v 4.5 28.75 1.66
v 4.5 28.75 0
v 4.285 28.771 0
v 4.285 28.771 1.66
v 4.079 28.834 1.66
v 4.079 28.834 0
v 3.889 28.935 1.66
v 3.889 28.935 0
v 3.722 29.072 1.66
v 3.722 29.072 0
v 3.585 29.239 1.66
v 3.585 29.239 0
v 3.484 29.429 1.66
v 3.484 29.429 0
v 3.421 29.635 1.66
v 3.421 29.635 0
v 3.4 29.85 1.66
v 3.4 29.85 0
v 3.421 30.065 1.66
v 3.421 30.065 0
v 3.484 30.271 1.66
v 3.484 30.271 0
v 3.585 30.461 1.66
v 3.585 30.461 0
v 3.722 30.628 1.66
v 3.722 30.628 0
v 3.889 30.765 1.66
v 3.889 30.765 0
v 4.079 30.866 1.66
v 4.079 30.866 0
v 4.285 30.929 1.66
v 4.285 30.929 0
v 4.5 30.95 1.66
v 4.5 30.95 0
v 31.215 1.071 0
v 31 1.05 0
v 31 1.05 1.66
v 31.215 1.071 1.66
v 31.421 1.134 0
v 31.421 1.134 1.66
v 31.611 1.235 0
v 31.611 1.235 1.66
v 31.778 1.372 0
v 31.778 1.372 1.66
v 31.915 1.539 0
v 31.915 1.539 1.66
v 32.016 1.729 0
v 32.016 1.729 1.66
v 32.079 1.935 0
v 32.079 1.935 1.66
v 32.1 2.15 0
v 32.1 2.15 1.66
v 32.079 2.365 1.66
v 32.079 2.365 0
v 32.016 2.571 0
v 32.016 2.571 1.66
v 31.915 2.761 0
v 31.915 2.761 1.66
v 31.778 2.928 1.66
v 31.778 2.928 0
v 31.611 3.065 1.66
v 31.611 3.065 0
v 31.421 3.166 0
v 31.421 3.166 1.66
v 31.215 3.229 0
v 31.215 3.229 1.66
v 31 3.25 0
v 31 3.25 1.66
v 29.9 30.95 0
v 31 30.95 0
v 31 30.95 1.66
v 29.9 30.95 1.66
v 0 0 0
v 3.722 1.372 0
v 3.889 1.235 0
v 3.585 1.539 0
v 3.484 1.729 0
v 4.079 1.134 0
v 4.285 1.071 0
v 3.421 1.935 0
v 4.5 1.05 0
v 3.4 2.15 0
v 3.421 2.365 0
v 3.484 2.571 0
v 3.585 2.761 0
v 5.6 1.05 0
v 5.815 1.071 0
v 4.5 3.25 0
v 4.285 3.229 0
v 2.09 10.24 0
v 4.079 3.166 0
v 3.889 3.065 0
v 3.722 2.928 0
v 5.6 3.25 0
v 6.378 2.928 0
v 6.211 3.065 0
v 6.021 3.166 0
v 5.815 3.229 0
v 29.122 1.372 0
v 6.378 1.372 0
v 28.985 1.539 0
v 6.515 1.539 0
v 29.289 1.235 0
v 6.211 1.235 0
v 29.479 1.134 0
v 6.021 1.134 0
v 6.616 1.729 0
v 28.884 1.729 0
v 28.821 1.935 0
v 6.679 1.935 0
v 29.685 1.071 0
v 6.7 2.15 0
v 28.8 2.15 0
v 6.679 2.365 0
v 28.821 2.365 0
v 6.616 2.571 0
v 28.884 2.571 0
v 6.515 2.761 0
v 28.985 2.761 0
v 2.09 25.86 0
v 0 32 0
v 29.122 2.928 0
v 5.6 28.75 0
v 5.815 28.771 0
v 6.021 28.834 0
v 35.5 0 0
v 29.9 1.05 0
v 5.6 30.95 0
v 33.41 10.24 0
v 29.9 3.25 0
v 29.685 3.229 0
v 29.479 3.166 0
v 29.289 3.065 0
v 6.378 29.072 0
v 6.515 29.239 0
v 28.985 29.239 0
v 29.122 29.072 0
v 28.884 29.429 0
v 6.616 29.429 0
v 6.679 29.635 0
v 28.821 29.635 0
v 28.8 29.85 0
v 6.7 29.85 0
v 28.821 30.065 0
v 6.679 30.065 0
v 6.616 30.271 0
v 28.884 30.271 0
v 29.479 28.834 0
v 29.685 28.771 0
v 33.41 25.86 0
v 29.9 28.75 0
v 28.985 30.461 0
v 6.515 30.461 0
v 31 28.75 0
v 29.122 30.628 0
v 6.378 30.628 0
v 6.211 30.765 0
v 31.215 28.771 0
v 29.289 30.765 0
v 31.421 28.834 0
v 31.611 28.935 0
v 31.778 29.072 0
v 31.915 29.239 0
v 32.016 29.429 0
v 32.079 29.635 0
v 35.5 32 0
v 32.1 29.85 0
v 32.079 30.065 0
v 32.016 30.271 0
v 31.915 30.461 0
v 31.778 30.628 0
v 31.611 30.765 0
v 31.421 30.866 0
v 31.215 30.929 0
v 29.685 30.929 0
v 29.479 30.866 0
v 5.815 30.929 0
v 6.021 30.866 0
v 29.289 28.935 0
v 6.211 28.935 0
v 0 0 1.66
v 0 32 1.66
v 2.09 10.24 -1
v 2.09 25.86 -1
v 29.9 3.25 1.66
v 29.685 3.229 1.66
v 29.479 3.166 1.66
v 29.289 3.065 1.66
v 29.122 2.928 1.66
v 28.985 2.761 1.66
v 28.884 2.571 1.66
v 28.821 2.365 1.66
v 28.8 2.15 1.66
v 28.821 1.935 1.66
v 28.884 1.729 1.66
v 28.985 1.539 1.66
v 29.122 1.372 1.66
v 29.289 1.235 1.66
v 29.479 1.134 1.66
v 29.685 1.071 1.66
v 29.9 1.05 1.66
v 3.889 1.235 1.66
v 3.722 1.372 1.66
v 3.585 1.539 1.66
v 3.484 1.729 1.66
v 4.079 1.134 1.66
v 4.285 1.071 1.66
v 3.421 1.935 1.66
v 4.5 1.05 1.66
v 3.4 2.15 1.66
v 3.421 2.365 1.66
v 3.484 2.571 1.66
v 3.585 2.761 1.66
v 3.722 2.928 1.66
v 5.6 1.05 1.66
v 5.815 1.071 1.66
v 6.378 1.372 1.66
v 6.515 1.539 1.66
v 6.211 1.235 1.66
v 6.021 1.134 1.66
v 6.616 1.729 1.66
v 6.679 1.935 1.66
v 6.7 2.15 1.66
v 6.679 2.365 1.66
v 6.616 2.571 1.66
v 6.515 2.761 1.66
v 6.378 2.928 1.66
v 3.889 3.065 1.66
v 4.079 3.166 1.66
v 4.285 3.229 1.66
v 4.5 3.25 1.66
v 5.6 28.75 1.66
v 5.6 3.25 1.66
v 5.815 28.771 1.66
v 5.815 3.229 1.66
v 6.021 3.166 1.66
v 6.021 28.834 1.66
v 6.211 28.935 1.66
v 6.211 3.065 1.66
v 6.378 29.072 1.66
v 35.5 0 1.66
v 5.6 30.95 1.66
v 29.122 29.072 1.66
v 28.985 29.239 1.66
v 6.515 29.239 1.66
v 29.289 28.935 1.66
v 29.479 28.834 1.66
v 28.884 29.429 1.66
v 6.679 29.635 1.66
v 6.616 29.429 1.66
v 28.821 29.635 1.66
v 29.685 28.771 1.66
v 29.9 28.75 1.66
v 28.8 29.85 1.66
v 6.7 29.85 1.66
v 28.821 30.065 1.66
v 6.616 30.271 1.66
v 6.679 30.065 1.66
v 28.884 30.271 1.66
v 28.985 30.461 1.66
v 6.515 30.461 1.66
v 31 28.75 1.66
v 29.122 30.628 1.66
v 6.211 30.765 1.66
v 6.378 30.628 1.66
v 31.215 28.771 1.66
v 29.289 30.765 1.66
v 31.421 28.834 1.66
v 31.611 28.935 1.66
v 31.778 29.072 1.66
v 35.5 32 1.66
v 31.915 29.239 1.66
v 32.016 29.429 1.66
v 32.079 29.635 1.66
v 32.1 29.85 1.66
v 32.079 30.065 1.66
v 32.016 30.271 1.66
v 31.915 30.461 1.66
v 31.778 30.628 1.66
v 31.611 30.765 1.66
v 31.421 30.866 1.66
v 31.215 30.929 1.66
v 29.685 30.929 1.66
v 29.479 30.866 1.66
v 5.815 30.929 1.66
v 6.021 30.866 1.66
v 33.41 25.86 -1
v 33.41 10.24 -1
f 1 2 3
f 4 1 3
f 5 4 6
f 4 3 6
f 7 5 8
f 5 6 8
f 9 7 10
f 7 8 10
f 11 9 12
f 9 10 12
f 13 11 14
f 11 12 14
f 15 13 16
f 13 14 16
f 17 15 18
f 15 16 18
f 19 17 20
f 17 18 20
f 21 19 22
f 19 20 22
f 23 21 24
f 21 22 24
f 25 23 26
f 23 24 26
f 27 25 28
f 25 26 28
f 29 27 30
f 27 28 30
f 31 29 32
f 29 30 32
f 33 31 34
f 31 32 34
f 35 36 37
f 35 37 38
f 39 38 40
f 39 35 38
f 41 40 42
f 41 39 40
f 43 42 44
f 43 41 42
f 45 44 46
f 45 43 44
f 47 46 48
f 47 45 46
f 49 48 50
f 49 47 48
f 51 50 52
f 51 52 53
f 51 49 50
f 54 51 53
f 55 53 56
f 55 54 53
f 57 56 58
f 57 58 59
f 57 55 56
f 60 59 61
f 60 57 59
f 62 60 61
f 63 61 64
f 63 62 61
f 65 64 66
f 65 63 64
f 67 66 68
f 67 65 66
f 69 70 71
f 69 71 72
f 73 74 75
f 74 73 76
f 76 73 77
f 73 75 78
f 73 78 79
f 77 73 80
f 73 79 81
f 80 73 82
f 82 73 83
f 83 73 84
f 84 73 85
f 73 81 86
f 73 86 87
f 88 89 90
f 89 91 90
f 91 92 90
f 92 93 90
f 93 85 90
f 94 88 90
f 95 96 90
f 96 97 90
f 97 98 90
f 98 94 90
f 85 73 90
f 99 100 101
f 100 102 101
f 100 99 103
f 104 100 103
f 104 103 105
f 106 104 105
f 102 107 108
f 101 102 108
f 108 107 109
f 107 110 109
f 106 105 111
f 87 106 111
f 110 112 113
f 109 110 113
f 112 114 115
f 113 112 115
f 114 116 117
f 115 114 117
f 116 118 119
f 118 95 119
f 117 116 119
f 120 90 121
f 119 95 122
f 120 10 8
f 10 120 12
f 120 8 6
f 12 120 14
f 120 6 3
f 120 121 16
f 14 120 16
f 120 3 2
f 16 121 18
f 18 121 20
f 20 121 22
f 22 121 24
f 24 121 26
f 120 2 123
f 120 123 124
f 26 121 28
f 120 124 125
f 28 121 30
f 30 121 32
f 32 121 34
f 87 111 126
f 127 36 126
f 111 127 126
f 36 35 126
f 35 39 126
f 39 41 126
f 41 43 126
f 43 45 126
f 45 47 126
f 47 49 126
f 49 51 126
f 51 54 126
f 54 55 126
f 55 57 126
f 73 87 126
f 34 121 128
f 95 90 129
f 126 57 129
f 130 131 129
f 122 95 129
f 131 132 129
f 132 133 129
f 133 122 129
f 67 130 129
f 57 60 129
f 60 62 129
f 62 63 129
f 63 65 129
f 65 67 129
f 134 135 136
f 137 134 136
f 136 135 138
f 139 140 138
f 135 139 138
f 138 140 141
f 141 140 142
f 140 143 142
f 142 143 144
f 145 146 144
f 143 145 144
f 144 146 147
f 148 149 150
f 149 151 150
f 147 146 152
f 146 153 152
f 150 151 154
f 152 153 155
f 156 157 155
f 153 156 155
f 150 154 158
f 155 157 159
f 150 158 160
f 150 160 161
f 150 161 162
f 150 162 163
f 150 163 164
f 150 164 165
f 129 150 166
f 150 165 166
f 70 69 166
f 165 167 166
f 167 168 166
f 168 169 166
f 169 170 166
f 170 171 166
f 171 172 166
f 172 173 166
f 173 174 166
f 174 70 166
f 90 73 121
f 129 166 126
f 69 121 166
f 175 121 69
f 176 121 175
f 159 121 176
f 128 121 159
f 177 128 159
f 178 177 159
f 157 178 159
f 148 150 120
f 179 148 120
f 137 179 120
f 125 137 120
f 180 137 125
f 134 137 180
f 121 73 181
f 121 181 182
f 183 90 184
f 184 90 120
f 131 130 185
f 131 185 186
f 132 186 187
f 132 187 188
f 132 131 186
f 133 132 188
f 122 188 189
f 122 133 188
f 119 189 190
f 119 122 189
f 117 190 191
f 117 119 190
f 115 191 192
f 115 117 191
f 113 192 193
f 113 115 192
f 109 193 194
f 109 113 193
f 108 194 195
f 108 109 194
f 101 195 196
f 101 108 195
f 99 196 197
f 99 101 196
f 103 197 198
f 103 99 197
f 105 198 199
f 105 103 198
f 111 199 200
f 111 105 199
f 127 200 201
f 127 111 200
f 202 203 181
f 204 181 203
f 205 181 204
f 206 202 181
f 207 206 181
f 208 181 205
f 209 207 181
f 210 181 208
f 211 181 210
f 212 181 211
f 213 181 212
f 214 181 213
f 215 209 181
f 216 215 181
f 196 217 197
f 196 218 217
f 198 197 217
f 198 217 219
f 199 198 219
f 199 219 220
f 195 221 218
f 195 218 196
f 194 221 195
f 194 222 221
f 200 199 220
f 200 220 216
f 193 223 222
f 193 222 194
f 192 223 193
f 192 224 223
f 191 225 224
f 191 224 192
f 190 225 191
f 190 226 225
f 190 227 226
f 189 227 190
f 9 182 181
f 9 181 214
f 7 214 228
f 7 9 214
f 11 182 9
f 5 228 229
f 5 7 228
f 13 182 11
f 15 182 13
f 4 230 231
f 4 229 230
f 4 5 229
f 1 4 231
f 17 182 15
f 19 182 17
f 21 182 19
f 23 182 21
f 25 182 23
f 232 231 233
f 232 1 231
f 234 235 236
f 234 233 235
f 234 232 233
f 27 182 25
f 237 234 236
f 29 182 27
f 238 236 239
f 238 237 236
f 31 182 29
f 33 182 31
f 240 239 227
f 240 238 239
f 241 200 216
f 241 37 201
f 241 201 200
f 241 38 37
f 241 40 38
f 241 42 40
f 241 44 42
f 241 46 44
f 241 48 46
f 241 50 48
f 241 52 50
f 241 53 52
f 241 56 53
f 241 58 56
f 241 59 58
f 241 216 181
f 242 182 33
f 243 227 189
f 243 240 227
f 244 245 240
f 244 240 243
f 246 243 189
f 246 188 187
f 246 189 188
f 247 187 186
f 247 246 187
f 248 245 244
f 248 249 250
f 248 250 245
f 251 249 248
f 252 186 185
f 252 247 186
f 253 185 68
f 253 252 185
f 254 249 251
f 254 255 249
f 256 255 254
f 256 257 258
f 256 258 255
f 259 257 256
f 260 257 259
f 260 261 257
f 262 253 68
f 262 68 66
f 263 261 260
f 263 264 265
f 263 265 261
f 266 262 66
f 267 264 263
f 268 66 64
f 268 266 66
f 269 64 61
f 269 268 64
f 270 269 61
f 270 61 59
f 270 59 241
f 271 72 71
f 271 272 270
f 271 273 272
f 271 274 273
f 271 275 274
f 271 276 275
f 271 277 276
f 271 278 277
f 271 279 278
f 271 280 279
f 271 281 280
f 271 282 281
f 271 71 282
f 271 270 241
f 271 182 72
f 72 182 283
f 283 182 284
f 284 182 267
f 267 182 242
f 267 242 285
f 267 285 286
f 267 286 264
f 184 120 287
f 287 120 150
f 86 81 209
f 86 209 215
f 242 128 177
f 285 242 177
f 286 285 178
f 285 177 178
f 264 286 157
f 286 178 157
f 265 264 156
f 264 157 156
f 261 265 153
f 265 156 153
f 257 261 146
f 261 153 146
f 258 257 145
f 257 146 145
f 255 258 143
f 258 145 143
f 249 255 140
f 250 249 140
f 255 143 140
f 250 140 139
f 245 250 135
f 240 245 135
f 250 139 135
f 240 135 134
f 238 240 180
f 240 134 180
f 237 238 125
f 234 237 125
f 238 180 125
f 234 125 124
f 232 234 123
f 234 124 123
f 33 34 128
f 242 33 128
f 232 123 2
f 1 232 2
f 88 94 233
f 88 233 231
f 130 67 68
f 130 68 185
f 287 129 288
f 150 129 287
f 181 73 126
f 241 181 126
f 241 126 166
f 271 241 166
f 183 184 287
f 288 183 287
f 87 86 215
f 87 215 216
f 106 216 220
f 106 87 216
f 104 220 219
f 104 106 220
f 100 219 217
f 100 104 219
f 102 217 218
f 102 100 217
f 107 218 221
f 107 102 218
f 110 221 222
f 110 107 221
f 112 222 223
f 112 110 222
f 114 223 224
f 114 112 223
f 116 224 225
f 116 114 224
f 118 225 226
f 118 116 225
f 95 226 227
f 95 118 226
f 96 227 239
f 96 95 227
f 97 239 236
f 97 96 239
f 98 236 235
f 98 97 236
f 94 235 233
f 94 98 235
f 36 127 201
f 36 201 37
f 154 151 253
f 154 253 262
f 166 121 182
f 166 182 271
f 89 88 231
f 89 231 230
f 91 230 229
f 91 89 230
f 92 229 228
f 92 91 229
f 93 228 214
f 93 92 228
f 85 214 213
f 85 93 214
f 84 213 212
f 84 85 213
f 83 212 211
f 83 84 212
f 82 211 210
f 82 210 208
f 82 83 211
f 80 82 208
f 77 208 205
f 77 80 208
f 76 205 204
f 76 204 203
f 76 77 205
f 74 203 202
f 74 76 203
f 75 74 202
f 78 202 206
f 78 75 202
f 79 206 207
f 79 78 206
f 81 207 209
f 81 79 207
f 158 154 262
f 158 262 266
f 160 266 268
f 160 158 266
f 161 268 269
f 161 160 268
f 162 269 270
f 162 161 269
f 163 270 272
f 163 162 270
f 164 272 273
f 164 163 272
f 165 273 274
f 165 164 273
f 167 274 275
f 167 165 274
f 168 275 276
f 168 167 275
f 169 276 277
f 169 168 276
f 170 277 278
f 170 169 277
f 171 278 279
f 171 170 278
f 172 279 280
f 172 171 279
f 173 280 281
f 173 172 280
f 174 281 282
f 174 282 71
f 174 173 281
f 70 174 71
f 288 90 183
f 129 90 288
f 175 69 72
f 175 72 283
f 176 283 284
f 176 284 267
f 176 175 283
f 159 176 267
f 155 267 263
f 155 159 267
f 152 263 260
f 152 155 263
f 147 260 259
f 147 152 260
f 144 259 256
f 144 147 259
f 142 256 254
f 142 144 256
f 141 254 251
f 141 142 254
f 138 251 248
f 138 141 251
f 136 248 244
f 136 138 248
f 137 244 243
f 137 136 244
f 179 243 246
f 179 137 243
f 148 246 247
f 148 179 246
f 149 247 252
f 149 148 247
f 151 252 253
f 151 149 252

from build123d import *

# Parameters (mm, degrees)
SKETCH1_W           = 35.5
SKETCH1_H           = 32
BOSS_EXTRUDE1_DEPTH = 1.66
SKETCH2_W           = 31.32
SKETCH2_H           = 15.62
BOSS_EXTRUDE2_DEPTH = 1


with BuildPart() as part:
    # Sketch1 → Boss-Extrude1 (new body)
    with BuildSketch(Plane.XY):
        with Locations((17.75, 16)):
            Rectangle(SKETCH1_W, SKETCH1_H)
        with BuildLine():
            Line((4.5, 30.95), (5.6, 30.95))
            ThreePointArc((5.6, 30.95), (6.7, 29.85), (5.6, 28.75))
            Line((5.6, 28.75), (4.5, 28.75))
            ThreePointArc((4.5, 28.75), (3.4, 29.85), (4.5, 30.95))
        make_face(mode=Mode.SUBTRACT)
        with BuildLine():
            Line((29.9, 28.75), (31, 28.75))
            ThreePointArc((31, 28.75), (32.1, 29.85), (31, 30.95))
            Line((31, 30.95), (29.9, 30.95))
            ThreePointArc((29.9, 30.95), (28.8, 29.85), (29.9, 28.75))
        make_face(mode=Mode.SUBTRACT)
        with BuildLine():
            Line((29.9, 1.05), (31, 1.05))
            ThreePointArc((31, 1.05), (32.1, 2.15), (31, 3.25))
            Line((31, 3.25), (29.9, 3.25))
            ThreePointArc((29.9, 3.25), (28.8, 2.15), (29.9, 1.05))
        make_face(mode=Mode.SUBTRACT)
        with BuildLine():
            Line((4.5, 1.05), (5.6, 1.05))
            ThreePointArc((5.6, 1.05), (6.7, 2.15), (5.6, 3.25))
            Line((5.6, 3.25), (4.5, 3.25))
            ThreePointArc((4.5, 3.25), (3.4, 2.15), (4.5, 1.05))
        make_face(mode=Mode.SUBTRACT)
    extrude(amount=BOSS_EXTRUDE1_DEPTH)

    # Sketch2 → Boss-Extrude2 (add)
    with BuildSketch(Plane.XY):
        with Locations((17.75, 18.05)):
            Rectangle(SKETCH2_W, SKETCH2_H)
    extrude(amount=-BOSS_EXTRUDE2_DEPTH)


solid = part.part
